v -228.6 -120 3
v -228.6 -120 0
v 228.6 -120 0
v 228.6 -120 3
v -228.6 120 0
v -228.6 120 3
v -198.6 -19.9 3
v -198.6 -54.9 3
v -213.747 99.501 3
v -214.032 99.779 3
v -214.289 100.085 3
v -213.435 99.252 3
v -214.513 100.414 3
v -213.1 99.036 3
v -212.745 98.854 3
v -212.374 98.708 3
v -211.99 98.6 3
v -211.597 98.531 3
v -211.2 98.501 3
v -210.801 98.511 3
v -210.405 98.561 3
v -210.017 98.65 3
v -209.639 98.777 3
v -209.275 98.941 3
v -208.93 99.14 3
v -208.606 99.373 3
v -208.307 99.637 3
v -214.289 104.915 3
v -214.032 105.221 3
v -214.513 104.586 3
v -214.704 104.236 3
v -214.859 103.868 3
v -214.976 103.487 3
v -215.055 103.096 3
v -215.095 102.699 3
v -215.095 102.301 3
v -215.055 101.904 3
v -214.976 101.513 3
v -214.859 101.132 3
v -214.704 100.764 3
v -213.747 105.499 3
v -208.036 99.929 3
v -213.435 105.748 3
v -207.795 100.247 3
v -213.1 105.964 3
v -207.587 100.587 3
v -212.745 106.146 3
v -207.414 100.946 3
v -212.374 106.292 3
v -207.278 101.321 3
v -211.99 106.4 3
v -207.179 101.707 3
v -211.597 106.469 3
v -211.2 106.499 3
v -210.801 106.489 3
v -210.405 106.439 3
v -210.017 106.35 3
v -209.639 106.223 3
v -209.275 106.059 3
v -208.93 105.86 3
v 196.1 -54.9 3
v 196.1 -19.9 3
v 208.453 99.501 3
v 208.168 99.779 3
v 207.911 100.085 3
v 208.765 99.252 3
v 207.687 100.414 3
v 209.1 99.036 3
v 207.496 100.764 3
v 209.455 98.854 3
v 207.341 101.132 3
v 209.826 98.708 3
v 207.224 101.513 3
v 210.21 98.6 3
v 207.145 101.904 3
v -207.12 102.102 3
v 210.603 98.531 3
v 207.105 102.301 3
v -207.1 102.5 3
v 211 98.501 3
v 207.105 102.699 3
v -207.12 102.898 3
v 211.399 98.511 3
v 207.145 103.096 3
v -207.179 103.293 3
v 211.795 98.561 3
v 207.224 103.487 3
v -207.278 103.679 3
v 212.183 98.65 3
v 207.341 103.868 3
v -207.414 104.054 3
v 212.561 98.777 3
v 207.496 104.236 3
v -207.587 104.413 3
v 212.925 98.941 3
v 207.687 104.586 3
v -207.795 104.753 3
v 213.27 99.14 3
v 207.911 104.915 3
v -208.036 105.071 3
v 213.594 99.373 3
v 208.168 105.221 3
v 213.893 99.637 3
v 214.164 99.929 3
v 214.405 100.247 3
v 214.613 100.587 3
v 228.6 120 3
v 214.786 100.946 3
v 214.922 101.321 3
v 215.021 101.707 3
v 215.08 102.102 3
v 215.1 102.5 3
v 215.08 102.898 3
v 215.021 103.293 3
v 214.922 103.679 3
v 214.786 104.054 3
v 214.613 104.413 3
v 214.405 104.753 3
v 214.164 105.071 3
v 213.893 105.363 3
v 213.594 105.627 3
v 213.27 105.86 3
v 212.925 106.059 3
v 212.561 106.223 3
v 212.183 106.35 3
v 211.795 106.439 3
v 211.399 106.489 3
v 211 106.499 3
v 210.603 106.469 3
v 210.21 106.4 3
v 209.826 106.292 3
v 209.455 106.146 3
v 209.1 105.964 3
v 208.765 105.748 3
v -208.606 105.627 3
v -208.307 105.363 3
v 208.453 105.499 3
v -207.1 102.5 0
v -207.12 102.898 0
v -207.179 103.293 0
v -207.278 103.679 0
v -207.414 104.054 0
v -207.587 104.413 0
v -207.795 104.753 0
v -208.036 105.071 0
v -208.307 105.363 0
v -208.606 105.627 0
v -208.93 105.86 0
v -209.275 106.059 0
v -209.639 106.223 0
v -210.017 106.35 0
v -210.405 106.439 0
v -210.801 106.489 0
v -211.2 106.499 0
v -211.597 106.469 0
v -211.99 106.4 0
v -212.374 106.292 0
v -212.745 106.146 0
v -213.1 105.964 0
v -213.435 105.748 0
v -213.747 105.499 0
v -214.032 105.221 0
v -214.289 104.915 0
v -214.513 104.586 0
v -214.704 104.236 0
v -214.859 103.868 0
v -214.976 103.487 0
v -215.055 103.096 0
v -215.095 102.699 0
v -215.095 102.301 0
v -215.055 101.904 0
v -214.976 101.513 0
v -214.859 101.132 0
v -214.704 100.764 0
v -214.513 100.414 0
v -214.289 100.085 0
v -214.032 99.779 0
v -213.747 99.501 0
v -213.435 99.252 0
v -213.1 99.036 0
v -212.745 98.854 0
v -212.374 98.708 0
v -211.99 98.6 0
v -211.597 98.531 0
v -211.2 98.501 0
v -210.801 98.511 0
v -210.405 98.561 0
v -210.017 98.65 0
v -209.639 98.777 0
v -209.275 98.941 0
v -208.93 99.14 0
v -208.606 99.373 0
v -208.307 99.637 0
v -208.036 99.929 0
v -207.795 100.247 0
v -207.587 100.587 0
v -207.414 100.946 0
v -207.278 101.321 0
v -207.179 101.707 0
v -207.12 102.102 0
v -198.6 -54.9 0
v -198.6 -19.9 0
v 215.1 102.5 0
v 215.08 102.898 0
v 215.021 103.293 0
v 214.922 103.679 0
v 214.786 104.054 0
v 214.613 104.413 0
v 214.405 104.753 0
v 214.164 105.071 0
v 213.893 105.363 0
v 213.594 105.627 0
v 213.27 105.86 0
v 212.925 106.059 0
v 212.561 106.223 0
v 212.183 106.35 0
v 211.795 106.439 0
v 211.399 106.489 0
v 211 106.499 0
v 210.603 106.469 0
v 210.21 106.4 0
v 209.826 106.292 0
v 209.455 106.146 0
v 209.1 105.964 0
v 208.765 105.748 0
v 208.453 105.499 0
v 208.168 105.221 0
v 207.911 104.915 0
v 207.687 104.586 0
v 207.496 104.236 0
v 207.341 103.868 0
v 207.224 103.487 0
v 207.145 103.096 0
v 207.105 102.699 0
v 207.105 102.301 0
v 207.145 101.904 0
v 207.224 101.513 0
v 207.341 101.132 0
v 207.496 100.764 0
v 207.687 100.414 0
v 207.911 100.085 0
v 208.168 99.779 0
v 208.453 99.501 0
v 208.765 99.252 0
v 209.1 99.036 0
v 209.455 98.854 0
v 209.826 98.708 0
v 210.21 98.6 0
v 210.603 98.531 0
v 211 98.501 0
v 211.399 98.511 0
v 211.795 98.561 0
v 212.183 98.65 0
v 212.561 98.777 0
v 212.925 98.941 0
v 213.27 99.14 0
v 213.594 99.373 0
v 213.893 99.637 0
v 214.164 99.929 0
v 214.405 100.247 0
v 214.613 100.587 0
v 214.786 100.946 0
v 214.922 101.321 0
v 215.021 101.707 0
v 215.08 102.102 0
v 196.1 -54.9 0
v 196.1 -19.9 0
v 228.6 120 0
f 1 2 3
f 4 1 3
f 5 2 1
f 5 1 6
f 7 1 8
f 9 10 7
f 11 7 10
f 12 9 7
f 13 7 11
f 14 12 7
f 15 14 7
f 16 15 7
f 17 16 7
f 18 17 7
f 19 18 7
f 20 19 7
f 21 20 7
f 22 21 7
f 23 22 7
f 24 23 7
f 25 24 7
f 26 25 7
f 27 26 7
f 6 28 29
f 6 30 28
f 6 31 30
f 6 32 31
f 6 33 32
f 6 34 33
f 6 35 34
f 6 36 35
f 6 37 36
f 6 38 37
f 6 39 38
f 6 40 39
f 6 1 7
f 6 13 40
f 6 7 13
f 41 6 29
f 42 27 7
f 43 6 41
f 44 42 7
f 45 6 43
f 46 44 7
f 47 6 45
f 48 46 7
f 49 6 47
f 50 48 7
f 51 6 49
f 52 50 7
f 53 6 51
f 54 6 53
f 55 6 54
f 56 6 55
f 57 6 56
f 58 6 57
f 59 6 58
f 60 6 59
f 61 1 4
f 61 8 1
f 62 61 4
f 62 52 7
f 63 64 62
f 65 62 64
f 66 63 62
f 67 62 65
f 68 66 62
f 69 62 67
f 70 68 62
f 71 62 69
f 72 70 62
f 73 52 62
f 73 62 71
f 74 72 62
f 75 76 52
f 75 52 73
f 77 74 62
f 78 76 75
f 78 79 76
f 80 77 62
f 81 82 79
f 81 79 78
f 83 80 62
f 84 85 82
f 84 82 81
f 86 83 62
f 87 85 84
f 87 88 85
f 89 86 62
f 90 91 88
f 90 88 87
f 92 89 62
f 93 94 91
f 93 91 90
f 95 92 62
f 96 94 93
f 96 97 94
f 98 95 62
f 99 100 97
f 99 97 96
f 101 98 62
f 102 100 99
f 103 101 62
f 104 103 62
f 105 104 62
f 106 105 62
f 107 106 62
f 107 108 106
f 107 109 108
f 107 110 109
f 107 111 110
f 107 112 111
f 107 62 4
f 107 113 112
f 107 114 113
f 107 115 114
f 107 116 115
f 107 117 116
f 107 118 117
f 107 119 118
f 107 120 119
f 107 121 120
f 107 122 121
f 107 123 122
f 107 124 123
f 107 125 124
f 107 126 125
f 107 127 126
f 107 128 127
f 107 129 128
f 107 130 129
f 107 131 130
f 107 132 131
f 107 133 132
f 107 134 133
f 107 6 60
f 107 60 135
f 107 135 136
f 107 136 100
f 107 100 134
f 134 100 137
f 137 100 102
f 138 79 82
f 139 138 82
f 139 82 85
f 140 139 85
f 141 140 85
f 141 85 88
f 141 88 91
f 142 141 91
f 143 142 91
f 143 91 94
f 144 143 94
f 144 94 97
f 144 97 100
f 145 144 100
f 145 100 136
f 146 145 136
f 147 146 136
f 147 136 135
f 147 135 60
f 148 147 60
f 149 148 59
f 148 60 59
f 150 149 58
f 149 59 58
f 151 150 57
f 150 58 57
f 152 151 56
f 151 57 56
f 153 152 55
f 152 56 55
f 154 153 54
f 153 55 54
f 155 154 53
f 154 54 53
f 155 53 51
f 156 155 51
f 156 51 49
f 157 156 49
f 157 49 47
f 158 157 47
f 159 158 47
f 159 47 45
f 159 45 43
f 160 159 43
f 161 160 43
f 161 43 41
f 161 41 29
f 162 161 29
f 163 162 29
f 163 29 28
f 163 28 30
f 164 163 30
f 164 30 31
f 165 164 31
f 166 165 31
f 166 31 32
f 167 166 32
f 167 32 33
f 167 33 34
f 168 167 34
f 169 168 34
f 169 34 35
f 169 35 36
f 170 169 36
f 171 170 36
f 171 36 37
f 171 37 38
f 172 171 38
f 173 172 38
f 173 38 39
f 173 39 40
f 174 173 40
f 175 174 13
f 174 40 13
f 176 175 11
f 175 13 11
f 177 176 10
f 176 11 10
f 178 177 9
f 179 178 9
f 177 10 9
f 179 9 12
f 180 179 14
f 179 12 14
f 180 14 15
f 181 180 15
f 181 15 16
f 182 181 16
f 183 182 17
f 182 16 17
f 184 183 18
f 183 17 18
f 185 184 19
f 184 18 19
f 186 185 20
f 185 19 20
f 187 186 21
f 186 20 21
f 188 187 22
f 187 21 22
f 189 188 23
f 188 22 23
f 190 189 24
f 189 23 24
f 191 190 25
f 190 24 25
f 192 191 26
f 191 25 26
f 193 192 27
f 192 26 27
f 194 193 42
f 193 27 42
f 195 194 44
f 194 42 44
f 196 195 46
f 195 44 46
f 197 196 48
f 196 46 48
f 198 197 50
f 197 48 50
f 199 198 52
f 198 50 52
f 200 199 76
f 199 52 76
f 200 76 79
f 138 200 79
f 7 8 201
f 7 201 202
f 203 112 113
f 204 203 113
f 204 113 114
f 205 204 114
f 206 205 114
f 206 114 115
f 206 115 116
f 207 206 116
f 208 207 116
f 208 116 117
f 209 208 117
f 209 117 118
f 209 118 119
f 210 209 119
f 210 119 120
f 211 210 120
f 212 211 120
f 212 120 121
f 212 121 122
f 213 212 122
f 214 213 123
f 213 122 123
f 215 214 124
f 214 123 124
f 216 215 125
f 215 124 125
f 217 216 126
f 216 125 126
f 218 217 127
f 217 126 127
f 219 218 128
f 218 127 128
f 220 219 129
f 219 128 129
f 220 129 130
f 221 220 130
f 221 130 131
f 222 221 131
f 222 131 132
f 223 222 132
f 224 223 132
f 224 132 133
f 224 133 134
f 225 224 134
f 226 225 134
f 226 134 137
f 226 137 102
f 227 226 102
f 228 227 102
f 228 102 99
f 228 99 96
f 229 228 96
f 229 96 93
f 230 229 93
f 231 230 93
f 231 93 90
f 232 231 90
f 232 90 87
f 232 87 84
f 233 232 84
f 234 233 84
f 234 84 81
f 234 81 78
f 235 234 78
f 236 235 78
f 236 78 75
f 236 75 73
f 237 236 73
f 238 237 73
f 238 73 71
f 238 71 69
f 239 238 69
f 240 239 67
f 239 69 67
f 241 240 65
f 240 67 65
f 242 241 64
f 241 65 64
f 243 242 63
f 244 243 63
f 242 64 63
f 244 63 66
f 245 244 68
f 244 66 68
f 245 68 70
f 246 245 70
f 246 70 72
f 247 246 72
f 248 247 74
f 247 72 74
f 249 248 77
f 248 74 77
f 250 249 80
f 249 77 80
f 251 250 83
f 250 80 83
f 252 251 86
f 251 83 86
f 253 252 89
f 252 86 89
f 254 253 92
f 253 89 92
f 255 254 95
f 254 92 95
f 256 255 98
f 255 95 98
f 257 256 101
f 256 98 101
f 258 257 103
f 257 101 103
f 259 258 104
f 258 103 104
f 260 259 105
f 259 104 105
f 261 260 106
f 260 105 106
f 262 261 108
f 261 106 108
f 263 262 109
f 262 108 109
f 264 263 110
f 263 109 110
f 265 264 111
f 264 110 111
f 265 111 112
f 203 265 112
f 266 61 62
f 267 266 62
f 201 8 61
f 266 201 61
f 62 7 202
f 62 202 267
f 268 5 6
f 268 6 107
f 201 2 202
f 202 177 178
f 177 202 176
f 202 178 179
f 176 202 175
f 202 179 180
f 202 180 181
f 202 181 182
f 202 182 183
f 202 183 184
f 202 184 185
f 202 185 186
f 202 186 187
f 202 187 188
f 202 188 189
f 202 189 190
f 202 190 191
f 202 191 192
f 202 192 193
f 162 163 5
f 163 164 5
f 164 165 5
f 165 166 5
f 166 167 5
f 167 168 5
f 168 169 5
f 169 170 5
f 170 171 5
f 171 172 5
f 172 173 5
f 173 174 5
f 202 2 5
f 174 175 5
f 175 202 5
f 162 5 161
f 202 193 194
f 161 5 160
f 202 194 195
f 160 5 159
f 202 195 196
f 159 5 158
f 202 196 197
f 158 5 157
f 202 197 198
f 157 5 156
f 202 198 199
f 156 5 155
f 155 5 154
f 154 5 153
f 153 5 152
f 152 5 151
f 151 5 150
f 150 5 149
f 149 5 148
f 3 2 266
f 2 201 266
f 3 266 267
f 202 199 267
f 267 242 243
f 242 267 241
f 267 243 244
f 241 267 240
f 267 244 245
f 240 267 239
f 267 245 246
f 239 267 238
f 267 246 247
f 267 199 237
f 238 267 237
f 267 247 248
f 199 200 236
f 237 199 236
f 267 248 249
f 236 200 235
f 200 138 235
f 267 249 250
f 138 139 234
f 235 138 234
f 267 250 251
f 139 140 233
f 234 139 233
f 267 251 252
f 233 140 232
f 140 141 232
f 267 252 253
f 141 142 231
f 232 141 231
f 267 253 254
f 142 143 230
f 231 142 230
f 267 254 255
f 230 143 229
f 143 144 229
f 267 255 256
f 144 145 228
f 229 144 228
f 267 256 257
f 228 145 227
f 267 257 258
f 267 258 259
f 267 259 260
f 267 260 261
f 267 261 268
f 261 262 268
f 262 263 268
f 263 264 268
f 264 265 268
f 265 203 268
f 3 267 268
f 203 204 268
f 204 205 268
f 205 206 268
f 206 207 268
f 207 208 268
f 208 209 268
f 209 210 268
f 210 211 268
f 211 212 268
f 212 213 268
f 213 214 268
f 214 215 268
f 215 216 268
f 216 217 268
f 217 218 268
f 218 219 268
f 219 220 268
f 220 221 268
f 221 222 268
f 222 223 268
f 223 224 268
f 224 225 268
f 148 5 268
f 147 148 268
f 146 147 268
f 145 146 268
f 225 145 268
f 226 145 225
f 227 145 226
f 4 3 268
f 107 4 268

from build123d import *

# Parameters (mm, degrees)
SKETCH1_W           = 457.2
SKETCH1_H           = 240
BOSS_EXTRUDE1_DEPTH = 3
SKETCH2_R           = 4
CUT_EXTRUDE1_DEPTH  = 259.199457784
SKETCH3_W           = 394.7
SKETCH3_H           = 35
CUT_EXTRUDE2_DEPTH  = 259.199457784


with BuildPart() as part:
    # Sketch1 → Boss-Extrude1 (new body)
    with BuildSketch(Plane.XY):
        Rectangle(SKETCH1_W, SKETCH1_H)
    extrude(amount=BOSS_EXTRUDE1_DEPTH)

    # Sketch2 → Cut-Extrude1 (cut, through all)
    with BuildSketch(Plane.XY.offset(3)):
        with Locations((-211.1, 102.5)):
            Circle(SKETCH2_R)
        with Locations((211.1, 102.5)):
            Circle(SKETCH2_R)
    extrude(amount=-CUT_EXTRUDE1_DEPTH, mode=Mode.SUBTRACT)

    # Sketch3 → Cut-Extrude2 (cut, through all)
    with BuildSketch(Plane.XY.offset(3)):
        with Locations((-1.25, -37.4)):
            Rectangle(SKETCH3_W, SKETCH3_H)
    extrude(amount=-CUT_EXTRUDE2_DEPTH, mode=Mode.SUBTRACT)


solid = part.part
